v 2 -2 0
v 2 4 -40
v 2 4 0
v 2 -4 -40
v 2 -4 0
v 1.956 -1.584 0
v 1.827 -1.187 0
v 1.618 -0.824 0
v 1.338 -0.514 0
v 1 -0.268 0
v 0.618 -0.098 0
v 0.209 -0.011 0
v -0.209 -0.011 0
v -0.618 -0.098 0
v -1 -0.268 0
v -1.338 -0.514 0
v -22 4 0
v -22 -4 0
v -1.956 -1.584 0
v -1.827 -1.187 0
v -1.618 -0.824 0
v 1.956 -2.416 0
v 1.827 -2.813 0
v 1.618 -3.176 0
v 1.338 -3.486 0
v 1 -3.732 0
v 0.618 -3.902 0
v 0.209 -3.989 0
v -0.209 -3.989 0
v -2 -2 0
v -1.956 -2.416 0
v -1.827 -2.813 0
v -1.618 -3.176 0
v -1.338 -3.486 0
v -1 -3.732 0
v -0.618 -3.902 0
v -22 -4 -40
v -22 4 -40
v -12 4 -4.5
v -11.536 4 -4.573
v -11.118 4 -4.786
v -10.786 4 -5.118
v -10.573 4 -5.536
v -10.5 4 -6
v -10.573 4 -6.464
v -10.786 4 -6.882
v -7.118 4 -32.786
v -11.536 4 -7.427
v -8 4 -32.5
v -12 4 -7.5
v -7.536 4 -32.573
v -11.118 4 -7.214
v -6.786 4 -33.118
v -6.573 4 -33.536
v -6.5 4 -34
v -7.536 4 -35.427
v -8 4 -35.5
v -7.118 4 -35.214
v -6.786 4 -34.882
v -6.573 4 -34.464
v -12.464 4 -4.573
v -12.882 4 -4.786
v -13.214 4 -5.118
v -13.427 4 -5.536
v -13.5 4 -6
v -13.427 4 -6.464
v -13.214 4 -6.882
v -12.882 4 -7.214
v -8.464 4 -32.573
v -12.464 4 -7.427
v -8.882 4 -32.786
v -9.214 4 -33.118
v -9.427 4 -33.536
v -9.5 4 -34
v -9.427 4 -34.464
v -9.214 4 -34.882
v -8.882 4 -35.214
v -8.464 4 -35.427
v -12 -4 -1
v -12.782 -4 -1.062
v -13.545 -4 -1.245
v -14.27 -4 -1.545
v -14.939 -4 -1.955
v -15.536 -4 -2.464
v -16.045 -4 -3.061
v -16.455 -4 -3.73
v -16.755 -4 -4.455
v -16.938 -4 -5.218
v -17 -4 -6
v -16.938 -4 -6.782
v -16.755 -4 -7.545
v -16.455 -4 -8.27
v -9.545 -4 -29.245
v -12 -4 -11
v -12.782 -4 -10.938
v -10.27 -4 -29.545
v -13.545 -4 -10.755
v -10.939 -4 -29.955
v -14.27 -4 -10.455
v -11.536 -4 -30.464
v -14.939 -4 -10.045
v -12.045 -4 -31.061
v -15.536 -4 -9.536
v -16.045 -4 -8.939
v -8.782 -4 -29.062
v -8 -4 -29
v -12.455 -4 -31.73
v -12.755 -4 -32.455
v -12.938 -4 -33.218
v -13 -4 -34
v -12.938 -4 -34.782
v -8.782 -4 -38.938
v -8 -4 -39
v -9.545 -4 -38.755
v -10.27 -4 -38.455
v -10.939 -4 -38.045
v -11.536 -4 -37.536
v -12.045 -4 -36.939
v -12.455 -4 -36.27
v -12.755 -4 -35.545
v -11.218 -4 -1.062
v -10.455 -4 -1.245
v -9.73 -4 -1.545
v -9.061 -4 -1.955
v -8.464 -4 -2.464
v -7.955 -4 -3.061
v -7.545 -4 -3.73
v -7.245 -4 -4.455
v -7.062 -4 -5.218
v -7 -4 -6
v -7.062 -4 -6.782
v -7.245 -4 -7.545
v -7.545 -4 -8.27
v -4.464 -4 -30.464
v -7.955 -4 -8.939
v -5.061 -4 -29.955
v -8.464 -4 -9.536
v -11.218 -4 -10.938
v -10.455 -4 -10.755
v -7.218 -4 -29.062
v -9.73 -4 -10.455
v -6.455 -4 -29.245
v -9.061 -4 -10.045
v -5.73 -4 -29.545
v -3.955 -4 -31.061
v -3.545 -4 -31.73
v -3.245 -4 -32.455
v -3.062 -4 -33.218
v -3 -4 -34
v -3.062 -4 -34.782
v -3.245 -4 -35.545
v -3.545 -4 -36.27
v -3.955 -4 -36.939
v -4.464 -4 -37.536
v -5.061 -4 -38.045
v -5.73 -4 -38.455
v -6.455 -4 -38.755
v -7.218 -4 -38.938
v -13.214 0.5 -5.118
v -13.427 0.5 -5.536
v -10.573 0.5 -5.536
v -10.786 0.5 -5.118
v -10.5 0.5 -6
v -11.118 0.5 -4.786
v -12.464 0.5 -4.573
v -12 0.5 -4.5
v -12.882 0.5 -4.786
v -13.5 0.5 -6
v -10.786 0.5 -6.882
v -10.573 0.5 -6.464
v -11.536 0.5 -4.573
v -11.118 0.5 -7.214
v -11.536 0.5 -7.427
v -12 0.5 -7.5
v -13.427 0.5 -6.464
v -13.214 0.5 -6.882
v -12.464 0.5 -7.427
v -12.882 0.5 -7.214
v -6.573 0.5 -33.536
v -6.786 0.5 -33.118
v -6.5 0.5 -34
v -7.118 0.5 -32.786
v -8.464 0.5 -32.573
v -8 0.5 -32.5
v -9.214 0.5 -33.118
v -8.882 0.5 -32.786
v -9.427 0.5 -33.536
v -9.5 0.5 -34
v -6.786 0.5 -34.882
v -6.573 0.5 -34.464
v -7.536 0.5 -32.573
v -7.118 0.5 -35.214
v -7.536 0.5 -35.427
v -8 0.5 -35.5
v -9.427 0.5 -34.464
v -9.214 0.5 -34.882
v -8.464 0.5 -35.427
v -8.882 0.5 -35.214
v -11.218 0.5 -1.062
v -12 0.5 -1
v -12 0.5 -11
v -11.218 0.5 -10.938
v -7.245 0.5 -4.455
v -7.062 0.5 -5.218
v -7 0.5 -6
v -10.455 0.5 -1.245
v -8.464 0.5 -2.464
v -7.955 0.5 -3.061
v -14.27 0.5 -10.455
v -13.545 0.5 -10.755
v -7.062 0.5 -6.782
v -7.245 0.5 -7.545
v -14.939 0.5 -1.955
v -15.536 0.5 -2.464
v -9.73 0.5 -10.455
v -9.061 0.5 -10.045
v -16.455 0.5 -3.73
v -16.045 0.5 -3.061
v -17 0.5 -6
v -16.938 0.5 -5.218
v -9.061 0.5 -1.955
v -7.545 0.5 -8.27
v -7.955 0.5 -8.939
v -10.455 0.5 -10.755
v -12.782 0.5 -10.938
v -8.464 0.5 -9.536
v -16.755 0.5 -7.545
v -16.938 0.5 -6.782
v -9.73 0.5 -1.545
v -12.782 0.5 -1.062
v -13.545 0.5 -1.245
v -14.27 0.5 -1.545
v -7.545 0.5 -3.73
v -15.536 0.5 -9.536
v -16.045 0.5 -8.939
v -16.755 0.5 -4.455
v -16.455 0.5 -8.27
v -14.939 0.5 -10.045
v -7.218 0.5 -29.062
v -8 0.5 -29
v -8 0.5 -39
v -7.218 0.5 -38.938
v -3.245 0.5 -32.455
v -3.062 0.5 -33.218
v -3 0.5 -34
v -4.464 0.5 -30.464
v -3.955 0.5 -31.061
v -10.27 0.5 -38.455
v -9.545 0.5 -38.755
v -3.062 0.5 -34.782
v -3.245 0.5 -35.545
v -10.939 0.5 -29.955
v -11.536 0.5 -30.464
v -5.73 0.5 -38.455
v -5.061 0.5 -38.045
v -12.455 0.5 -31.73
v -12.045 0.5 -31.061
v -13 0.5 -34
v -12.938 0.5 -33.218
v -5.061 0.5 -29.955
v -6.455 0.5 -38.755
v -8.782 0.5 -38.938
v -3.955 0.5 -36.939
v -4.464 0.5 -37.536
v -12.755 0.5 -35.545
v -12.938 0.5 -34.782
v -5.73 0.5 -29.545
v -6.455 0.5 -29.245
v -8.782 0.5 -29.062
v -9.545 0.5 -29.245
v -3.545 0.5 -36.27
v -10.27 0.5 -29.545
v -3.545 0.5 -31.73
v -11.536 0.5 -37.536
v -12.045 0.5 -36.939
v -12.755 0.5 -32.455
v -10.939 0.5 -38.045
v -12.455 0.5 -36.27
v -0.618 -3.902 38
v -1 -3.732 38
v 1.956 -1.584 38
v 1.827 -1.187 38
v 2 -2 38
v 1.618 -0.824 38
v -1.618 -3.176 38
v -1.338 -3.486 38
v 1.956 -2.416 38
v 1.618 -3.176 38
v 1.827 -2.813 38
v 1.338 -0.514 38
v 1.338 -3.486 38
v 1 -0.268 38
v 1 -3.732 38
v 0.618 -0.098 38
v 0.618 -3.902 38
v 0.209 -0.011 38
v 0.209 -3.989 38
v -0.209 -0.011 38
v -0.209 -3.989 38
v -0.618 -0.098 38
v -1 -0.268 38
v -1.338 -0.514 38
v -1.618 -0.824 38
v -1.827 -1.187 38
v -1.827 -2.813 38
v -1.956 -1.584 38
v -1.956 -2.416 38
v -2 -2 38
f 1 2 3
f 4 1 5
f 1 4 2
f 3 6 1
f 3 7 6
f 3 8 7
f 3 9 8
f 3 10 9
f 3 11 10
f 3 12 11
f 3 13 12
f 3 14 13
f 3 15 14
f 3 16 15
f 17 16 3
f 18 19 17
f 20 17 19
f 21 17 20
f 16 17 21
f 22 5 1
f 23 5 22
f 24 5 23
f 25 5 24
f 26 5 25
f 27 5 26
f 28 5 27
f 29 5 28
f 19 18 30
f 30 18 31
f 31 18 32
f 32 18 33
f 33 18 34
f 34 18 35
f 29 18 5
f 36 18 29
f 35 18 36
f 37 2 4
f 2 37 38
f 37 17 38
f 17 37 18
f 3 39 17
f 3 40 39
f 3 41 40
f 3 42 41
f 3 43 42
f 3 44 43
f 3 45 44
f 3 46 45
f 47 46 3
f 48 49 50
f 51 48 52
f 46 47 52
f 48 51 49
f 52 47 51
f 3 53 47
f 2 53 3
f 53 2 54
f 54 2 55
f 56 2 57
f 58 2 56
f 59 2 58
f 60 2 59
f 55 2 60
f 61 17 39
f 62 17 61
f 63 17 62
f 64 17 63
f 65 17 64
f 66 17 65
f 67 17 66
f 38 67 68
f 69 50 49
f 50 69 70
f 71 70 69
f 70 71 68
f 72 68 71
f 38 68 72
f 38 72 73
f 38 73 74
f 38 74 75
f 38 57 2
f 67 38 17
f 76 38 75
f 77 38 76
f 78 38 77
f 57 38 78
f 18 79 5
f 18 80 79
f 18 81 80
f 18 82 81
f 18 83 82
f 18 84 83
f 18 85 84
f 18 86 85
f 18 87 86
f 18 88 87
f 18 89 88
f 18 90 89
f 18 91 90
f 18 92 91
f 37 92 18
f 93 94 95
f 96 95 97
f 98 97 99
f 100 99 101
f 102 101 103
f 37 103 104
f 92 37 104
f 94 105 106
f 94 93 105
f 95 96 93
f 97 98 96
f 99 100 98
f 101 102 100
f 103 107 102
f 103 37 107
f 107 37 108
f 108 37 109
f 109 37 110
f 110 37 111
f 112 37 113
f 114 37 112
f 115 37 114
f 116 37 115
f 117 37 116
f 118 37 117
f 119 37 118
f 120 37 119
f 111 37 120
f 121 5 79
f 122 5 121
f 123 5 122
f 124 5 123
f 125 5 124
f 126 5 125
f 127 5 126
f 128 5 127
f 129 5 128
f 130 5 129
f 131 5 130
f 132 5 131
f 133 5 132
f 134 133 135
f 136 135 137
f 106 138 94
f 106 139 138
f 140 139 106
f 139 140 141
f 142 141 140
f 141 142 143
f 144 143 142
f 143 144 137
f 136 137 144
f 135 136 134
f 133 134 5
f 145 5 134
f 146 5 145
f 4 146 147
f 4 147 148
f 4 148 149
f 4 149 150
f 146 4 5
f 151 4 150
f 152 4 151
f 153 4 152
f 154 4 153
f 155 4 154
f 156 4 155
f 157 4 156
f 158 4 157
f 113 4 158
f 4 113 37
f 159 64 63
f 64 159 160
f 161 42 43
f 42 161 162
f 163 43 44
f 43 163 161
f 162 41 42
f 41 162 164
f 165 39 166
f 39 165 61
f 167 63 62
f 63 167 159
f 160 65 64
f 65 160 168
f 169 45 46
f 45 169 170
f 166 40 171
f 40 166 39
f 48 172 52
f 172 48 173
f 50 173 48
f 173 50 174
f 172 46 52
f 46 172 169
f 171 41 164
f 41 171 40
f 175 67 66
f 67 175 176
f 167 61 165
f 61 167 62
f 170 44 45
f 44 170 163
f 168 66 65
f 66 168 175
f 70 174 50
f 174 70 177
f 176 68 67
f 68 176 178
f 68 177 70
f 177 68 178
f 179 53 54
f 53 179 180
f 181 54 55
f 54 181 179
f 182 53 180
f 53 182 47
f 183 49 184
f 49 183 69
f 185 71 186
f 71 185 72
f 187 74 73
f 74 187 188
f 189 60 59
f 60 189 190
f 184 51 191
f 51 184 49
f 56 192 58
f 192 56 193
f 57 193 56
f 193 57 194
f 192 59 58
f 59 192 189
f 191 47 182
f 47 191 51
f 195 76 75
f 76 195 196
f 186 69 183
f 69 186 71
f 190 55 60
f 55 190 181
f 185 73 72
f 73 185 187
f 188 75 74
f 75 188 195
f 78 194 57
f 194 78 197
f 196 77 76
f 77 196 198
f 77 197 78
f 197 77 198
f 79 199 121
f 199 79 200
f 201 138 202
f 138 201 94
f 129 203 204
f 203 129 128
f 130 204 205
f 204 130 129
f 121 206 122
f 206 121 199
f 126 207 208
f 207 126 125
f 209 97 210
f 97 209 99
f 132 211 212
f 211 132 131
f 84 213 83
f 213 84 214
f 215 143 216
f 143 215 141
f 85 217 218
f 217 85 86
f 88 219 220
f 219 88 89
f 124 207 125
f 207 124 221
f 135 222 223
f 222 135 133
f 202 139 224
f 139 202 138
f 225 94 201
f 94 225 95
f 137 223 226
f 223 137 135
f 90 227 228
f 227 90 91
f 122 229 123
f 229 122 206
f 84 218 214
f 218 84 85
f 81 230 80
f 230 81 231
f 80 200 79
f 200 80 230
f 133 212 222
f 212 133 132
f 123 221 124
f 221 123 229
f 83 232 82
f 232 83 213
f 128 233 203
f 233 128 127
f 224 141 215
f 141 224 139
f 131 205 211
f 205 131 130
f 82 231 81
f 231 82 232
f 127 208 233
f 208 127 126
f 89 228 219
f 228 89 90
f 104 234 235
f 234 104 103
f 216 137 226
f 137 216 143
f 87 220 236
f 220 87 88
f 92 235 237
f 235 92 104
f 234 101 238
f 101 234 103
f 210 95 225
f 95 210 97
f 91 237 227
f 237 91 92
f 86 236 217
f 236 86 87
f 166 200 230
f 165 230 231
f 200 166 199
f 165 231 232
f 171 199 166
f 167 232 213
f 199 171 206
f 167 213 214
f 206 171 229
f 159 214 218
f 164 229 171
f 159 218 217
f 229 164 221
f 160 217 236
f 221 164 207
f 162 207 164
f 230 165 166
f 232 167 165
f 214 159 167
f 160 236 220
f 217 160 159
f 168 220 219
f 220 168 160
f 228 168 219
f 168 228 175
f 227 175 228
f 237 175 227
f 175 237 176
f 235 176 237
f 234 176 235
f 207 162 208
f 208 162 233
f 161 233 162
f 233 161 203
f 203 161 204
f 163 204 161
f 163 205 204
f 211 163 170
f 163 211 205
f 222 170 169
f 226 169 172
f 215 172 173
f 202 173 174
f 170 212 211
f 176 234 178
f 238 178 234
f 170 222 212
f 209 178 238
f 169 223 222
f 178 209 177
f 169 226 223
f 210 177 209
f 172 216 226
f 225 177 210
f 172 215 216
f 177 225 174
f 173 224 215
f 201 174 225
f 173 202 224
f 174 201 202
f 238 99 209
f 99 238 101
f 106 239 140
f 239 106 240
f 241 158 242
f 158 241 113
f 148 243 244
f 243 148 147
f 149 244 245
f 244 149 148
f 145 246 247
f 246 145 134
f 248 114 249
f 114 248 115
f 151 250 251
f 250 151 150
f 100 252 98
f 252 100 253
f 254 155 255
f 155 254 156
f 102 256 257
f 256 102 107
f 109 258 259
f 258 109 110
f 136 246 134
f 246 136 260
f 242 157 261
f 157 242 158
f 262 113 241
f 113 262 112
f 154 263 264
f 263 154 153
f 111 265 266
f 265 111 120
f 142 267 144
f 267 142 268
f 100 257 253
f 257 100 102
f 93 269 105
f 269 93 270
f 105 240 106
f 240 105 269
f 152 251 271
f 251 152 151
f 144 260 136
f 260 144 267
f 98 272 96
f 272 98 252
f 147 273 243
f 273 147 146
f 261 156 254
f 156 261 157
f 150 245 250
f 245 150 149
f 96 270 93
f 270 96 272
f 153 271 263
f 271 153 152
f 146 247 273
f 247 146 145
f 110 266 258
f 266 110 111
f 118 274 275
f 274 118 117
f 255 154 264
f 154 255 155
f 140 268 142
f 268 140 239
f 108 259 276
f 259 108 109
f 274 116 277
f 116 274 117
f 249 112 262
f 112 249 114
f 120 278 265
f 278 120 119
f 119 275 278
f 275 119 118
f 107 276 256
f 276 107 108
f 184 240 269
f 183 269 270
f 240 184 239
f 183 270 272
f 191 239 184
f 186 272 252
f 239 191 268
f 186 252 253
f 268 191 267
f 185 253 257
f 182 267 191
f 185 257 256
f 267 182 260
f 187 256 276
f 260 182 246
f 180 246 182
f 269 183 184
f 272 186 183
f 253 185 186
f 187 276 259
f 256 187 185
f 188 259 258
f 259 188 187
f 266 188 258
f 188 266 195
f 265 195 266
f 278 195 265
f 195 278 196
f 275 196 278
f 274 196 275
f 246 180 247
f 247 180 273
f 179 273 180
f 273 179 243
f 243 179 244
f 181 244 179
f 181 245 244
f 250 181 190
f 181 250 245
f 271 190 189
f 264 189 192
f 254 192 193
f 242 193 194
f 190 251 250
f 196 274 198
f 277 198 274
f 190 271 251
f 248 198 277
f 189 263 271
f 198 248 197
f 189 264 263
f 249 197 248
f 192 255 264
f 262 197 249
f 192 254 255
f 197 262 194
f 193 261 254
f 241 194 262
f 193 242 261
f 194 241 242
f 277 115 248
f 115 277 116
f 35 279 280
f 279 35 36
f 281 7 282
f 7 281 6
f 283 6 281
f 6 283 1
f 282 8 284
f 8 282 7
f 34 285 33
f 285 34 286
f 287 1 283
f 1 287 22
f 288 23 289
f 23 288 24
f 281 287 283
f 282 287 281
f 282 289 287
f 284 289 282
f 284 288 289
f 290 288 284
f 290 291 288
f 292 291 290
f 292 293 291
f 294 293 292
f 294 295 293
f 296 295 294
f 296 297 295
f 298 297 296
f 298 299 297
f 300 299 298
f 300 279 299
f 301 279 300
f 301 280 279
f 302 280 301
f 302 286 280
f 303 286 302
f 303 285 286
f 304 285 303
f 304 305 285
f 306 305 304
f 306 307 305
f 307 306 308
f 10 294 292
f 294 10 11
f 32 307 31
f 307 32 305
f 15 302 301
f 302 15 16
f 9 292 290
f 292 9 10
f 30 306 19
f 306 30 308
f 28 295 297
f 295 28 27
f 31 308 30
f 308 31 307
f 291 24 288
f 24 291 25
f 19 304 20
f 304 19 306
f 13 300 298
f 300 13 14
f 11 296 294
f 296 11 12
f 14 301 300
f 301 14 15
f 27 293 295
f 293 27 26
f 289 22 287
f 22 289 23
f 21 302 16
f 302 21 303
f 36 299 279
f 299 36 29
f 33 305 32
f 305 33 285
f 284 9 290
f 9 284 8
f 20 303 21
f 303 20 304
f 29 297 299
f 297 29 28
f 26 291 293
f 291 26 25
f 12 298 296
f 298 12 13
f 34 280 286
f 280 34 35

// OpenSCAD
module hinge_bottom() {
    union(){
    translate([0,-2, 0])
    cylinder(d=4, h=38, $fn=30);

    difference() {
        translate([-24/2+2, 0,-40/2])
        cube([24, 8, 40], center=true);

        translate([-10-2, 0,-6])
        rotate([90,0,0])
        cylinder(d=3, h=10, center=true, $fn=20);

        translate([-10+2,0,-34])
        rotate([90,0,0])
        cylinder(d=3, h=10, center=true, $fn=20);
        
        translate([-12, -2, -6])
        rotate([90,0,0])
        cylinder(d=10, h=5, center=true, $fn=40);
        
        translate([-8, -2, -34])
        rotate([90,0,0])
        cylinder(d=10, h=5, center=true, $fn=40);
    }
}
}

module hinge_top() {
    union() {
        difference() {
            cylinder(d=10, h=42, $fn=50);
            translate([0,0,-0.2])
            cylinder(d=4.4, h=40, $fn=30);
        }

        difference() {
            translate([2.5,-4.5,0])
            cube([60, 9, 42]);
            translate([5, -1.5, -1])
            cube([60, 3, 44]);
            
            for (x=[10,50]) {
                for (y=[34,8]) {
                    translate([x,0,y])
                    rotate([90,0,0])
                    cylinder(d=2.4, h=10, center=true, $fn=20);
                }
            }
        }
    }
}
//translate([0,2,0])
hinge_bottom();
//hinge_top();
